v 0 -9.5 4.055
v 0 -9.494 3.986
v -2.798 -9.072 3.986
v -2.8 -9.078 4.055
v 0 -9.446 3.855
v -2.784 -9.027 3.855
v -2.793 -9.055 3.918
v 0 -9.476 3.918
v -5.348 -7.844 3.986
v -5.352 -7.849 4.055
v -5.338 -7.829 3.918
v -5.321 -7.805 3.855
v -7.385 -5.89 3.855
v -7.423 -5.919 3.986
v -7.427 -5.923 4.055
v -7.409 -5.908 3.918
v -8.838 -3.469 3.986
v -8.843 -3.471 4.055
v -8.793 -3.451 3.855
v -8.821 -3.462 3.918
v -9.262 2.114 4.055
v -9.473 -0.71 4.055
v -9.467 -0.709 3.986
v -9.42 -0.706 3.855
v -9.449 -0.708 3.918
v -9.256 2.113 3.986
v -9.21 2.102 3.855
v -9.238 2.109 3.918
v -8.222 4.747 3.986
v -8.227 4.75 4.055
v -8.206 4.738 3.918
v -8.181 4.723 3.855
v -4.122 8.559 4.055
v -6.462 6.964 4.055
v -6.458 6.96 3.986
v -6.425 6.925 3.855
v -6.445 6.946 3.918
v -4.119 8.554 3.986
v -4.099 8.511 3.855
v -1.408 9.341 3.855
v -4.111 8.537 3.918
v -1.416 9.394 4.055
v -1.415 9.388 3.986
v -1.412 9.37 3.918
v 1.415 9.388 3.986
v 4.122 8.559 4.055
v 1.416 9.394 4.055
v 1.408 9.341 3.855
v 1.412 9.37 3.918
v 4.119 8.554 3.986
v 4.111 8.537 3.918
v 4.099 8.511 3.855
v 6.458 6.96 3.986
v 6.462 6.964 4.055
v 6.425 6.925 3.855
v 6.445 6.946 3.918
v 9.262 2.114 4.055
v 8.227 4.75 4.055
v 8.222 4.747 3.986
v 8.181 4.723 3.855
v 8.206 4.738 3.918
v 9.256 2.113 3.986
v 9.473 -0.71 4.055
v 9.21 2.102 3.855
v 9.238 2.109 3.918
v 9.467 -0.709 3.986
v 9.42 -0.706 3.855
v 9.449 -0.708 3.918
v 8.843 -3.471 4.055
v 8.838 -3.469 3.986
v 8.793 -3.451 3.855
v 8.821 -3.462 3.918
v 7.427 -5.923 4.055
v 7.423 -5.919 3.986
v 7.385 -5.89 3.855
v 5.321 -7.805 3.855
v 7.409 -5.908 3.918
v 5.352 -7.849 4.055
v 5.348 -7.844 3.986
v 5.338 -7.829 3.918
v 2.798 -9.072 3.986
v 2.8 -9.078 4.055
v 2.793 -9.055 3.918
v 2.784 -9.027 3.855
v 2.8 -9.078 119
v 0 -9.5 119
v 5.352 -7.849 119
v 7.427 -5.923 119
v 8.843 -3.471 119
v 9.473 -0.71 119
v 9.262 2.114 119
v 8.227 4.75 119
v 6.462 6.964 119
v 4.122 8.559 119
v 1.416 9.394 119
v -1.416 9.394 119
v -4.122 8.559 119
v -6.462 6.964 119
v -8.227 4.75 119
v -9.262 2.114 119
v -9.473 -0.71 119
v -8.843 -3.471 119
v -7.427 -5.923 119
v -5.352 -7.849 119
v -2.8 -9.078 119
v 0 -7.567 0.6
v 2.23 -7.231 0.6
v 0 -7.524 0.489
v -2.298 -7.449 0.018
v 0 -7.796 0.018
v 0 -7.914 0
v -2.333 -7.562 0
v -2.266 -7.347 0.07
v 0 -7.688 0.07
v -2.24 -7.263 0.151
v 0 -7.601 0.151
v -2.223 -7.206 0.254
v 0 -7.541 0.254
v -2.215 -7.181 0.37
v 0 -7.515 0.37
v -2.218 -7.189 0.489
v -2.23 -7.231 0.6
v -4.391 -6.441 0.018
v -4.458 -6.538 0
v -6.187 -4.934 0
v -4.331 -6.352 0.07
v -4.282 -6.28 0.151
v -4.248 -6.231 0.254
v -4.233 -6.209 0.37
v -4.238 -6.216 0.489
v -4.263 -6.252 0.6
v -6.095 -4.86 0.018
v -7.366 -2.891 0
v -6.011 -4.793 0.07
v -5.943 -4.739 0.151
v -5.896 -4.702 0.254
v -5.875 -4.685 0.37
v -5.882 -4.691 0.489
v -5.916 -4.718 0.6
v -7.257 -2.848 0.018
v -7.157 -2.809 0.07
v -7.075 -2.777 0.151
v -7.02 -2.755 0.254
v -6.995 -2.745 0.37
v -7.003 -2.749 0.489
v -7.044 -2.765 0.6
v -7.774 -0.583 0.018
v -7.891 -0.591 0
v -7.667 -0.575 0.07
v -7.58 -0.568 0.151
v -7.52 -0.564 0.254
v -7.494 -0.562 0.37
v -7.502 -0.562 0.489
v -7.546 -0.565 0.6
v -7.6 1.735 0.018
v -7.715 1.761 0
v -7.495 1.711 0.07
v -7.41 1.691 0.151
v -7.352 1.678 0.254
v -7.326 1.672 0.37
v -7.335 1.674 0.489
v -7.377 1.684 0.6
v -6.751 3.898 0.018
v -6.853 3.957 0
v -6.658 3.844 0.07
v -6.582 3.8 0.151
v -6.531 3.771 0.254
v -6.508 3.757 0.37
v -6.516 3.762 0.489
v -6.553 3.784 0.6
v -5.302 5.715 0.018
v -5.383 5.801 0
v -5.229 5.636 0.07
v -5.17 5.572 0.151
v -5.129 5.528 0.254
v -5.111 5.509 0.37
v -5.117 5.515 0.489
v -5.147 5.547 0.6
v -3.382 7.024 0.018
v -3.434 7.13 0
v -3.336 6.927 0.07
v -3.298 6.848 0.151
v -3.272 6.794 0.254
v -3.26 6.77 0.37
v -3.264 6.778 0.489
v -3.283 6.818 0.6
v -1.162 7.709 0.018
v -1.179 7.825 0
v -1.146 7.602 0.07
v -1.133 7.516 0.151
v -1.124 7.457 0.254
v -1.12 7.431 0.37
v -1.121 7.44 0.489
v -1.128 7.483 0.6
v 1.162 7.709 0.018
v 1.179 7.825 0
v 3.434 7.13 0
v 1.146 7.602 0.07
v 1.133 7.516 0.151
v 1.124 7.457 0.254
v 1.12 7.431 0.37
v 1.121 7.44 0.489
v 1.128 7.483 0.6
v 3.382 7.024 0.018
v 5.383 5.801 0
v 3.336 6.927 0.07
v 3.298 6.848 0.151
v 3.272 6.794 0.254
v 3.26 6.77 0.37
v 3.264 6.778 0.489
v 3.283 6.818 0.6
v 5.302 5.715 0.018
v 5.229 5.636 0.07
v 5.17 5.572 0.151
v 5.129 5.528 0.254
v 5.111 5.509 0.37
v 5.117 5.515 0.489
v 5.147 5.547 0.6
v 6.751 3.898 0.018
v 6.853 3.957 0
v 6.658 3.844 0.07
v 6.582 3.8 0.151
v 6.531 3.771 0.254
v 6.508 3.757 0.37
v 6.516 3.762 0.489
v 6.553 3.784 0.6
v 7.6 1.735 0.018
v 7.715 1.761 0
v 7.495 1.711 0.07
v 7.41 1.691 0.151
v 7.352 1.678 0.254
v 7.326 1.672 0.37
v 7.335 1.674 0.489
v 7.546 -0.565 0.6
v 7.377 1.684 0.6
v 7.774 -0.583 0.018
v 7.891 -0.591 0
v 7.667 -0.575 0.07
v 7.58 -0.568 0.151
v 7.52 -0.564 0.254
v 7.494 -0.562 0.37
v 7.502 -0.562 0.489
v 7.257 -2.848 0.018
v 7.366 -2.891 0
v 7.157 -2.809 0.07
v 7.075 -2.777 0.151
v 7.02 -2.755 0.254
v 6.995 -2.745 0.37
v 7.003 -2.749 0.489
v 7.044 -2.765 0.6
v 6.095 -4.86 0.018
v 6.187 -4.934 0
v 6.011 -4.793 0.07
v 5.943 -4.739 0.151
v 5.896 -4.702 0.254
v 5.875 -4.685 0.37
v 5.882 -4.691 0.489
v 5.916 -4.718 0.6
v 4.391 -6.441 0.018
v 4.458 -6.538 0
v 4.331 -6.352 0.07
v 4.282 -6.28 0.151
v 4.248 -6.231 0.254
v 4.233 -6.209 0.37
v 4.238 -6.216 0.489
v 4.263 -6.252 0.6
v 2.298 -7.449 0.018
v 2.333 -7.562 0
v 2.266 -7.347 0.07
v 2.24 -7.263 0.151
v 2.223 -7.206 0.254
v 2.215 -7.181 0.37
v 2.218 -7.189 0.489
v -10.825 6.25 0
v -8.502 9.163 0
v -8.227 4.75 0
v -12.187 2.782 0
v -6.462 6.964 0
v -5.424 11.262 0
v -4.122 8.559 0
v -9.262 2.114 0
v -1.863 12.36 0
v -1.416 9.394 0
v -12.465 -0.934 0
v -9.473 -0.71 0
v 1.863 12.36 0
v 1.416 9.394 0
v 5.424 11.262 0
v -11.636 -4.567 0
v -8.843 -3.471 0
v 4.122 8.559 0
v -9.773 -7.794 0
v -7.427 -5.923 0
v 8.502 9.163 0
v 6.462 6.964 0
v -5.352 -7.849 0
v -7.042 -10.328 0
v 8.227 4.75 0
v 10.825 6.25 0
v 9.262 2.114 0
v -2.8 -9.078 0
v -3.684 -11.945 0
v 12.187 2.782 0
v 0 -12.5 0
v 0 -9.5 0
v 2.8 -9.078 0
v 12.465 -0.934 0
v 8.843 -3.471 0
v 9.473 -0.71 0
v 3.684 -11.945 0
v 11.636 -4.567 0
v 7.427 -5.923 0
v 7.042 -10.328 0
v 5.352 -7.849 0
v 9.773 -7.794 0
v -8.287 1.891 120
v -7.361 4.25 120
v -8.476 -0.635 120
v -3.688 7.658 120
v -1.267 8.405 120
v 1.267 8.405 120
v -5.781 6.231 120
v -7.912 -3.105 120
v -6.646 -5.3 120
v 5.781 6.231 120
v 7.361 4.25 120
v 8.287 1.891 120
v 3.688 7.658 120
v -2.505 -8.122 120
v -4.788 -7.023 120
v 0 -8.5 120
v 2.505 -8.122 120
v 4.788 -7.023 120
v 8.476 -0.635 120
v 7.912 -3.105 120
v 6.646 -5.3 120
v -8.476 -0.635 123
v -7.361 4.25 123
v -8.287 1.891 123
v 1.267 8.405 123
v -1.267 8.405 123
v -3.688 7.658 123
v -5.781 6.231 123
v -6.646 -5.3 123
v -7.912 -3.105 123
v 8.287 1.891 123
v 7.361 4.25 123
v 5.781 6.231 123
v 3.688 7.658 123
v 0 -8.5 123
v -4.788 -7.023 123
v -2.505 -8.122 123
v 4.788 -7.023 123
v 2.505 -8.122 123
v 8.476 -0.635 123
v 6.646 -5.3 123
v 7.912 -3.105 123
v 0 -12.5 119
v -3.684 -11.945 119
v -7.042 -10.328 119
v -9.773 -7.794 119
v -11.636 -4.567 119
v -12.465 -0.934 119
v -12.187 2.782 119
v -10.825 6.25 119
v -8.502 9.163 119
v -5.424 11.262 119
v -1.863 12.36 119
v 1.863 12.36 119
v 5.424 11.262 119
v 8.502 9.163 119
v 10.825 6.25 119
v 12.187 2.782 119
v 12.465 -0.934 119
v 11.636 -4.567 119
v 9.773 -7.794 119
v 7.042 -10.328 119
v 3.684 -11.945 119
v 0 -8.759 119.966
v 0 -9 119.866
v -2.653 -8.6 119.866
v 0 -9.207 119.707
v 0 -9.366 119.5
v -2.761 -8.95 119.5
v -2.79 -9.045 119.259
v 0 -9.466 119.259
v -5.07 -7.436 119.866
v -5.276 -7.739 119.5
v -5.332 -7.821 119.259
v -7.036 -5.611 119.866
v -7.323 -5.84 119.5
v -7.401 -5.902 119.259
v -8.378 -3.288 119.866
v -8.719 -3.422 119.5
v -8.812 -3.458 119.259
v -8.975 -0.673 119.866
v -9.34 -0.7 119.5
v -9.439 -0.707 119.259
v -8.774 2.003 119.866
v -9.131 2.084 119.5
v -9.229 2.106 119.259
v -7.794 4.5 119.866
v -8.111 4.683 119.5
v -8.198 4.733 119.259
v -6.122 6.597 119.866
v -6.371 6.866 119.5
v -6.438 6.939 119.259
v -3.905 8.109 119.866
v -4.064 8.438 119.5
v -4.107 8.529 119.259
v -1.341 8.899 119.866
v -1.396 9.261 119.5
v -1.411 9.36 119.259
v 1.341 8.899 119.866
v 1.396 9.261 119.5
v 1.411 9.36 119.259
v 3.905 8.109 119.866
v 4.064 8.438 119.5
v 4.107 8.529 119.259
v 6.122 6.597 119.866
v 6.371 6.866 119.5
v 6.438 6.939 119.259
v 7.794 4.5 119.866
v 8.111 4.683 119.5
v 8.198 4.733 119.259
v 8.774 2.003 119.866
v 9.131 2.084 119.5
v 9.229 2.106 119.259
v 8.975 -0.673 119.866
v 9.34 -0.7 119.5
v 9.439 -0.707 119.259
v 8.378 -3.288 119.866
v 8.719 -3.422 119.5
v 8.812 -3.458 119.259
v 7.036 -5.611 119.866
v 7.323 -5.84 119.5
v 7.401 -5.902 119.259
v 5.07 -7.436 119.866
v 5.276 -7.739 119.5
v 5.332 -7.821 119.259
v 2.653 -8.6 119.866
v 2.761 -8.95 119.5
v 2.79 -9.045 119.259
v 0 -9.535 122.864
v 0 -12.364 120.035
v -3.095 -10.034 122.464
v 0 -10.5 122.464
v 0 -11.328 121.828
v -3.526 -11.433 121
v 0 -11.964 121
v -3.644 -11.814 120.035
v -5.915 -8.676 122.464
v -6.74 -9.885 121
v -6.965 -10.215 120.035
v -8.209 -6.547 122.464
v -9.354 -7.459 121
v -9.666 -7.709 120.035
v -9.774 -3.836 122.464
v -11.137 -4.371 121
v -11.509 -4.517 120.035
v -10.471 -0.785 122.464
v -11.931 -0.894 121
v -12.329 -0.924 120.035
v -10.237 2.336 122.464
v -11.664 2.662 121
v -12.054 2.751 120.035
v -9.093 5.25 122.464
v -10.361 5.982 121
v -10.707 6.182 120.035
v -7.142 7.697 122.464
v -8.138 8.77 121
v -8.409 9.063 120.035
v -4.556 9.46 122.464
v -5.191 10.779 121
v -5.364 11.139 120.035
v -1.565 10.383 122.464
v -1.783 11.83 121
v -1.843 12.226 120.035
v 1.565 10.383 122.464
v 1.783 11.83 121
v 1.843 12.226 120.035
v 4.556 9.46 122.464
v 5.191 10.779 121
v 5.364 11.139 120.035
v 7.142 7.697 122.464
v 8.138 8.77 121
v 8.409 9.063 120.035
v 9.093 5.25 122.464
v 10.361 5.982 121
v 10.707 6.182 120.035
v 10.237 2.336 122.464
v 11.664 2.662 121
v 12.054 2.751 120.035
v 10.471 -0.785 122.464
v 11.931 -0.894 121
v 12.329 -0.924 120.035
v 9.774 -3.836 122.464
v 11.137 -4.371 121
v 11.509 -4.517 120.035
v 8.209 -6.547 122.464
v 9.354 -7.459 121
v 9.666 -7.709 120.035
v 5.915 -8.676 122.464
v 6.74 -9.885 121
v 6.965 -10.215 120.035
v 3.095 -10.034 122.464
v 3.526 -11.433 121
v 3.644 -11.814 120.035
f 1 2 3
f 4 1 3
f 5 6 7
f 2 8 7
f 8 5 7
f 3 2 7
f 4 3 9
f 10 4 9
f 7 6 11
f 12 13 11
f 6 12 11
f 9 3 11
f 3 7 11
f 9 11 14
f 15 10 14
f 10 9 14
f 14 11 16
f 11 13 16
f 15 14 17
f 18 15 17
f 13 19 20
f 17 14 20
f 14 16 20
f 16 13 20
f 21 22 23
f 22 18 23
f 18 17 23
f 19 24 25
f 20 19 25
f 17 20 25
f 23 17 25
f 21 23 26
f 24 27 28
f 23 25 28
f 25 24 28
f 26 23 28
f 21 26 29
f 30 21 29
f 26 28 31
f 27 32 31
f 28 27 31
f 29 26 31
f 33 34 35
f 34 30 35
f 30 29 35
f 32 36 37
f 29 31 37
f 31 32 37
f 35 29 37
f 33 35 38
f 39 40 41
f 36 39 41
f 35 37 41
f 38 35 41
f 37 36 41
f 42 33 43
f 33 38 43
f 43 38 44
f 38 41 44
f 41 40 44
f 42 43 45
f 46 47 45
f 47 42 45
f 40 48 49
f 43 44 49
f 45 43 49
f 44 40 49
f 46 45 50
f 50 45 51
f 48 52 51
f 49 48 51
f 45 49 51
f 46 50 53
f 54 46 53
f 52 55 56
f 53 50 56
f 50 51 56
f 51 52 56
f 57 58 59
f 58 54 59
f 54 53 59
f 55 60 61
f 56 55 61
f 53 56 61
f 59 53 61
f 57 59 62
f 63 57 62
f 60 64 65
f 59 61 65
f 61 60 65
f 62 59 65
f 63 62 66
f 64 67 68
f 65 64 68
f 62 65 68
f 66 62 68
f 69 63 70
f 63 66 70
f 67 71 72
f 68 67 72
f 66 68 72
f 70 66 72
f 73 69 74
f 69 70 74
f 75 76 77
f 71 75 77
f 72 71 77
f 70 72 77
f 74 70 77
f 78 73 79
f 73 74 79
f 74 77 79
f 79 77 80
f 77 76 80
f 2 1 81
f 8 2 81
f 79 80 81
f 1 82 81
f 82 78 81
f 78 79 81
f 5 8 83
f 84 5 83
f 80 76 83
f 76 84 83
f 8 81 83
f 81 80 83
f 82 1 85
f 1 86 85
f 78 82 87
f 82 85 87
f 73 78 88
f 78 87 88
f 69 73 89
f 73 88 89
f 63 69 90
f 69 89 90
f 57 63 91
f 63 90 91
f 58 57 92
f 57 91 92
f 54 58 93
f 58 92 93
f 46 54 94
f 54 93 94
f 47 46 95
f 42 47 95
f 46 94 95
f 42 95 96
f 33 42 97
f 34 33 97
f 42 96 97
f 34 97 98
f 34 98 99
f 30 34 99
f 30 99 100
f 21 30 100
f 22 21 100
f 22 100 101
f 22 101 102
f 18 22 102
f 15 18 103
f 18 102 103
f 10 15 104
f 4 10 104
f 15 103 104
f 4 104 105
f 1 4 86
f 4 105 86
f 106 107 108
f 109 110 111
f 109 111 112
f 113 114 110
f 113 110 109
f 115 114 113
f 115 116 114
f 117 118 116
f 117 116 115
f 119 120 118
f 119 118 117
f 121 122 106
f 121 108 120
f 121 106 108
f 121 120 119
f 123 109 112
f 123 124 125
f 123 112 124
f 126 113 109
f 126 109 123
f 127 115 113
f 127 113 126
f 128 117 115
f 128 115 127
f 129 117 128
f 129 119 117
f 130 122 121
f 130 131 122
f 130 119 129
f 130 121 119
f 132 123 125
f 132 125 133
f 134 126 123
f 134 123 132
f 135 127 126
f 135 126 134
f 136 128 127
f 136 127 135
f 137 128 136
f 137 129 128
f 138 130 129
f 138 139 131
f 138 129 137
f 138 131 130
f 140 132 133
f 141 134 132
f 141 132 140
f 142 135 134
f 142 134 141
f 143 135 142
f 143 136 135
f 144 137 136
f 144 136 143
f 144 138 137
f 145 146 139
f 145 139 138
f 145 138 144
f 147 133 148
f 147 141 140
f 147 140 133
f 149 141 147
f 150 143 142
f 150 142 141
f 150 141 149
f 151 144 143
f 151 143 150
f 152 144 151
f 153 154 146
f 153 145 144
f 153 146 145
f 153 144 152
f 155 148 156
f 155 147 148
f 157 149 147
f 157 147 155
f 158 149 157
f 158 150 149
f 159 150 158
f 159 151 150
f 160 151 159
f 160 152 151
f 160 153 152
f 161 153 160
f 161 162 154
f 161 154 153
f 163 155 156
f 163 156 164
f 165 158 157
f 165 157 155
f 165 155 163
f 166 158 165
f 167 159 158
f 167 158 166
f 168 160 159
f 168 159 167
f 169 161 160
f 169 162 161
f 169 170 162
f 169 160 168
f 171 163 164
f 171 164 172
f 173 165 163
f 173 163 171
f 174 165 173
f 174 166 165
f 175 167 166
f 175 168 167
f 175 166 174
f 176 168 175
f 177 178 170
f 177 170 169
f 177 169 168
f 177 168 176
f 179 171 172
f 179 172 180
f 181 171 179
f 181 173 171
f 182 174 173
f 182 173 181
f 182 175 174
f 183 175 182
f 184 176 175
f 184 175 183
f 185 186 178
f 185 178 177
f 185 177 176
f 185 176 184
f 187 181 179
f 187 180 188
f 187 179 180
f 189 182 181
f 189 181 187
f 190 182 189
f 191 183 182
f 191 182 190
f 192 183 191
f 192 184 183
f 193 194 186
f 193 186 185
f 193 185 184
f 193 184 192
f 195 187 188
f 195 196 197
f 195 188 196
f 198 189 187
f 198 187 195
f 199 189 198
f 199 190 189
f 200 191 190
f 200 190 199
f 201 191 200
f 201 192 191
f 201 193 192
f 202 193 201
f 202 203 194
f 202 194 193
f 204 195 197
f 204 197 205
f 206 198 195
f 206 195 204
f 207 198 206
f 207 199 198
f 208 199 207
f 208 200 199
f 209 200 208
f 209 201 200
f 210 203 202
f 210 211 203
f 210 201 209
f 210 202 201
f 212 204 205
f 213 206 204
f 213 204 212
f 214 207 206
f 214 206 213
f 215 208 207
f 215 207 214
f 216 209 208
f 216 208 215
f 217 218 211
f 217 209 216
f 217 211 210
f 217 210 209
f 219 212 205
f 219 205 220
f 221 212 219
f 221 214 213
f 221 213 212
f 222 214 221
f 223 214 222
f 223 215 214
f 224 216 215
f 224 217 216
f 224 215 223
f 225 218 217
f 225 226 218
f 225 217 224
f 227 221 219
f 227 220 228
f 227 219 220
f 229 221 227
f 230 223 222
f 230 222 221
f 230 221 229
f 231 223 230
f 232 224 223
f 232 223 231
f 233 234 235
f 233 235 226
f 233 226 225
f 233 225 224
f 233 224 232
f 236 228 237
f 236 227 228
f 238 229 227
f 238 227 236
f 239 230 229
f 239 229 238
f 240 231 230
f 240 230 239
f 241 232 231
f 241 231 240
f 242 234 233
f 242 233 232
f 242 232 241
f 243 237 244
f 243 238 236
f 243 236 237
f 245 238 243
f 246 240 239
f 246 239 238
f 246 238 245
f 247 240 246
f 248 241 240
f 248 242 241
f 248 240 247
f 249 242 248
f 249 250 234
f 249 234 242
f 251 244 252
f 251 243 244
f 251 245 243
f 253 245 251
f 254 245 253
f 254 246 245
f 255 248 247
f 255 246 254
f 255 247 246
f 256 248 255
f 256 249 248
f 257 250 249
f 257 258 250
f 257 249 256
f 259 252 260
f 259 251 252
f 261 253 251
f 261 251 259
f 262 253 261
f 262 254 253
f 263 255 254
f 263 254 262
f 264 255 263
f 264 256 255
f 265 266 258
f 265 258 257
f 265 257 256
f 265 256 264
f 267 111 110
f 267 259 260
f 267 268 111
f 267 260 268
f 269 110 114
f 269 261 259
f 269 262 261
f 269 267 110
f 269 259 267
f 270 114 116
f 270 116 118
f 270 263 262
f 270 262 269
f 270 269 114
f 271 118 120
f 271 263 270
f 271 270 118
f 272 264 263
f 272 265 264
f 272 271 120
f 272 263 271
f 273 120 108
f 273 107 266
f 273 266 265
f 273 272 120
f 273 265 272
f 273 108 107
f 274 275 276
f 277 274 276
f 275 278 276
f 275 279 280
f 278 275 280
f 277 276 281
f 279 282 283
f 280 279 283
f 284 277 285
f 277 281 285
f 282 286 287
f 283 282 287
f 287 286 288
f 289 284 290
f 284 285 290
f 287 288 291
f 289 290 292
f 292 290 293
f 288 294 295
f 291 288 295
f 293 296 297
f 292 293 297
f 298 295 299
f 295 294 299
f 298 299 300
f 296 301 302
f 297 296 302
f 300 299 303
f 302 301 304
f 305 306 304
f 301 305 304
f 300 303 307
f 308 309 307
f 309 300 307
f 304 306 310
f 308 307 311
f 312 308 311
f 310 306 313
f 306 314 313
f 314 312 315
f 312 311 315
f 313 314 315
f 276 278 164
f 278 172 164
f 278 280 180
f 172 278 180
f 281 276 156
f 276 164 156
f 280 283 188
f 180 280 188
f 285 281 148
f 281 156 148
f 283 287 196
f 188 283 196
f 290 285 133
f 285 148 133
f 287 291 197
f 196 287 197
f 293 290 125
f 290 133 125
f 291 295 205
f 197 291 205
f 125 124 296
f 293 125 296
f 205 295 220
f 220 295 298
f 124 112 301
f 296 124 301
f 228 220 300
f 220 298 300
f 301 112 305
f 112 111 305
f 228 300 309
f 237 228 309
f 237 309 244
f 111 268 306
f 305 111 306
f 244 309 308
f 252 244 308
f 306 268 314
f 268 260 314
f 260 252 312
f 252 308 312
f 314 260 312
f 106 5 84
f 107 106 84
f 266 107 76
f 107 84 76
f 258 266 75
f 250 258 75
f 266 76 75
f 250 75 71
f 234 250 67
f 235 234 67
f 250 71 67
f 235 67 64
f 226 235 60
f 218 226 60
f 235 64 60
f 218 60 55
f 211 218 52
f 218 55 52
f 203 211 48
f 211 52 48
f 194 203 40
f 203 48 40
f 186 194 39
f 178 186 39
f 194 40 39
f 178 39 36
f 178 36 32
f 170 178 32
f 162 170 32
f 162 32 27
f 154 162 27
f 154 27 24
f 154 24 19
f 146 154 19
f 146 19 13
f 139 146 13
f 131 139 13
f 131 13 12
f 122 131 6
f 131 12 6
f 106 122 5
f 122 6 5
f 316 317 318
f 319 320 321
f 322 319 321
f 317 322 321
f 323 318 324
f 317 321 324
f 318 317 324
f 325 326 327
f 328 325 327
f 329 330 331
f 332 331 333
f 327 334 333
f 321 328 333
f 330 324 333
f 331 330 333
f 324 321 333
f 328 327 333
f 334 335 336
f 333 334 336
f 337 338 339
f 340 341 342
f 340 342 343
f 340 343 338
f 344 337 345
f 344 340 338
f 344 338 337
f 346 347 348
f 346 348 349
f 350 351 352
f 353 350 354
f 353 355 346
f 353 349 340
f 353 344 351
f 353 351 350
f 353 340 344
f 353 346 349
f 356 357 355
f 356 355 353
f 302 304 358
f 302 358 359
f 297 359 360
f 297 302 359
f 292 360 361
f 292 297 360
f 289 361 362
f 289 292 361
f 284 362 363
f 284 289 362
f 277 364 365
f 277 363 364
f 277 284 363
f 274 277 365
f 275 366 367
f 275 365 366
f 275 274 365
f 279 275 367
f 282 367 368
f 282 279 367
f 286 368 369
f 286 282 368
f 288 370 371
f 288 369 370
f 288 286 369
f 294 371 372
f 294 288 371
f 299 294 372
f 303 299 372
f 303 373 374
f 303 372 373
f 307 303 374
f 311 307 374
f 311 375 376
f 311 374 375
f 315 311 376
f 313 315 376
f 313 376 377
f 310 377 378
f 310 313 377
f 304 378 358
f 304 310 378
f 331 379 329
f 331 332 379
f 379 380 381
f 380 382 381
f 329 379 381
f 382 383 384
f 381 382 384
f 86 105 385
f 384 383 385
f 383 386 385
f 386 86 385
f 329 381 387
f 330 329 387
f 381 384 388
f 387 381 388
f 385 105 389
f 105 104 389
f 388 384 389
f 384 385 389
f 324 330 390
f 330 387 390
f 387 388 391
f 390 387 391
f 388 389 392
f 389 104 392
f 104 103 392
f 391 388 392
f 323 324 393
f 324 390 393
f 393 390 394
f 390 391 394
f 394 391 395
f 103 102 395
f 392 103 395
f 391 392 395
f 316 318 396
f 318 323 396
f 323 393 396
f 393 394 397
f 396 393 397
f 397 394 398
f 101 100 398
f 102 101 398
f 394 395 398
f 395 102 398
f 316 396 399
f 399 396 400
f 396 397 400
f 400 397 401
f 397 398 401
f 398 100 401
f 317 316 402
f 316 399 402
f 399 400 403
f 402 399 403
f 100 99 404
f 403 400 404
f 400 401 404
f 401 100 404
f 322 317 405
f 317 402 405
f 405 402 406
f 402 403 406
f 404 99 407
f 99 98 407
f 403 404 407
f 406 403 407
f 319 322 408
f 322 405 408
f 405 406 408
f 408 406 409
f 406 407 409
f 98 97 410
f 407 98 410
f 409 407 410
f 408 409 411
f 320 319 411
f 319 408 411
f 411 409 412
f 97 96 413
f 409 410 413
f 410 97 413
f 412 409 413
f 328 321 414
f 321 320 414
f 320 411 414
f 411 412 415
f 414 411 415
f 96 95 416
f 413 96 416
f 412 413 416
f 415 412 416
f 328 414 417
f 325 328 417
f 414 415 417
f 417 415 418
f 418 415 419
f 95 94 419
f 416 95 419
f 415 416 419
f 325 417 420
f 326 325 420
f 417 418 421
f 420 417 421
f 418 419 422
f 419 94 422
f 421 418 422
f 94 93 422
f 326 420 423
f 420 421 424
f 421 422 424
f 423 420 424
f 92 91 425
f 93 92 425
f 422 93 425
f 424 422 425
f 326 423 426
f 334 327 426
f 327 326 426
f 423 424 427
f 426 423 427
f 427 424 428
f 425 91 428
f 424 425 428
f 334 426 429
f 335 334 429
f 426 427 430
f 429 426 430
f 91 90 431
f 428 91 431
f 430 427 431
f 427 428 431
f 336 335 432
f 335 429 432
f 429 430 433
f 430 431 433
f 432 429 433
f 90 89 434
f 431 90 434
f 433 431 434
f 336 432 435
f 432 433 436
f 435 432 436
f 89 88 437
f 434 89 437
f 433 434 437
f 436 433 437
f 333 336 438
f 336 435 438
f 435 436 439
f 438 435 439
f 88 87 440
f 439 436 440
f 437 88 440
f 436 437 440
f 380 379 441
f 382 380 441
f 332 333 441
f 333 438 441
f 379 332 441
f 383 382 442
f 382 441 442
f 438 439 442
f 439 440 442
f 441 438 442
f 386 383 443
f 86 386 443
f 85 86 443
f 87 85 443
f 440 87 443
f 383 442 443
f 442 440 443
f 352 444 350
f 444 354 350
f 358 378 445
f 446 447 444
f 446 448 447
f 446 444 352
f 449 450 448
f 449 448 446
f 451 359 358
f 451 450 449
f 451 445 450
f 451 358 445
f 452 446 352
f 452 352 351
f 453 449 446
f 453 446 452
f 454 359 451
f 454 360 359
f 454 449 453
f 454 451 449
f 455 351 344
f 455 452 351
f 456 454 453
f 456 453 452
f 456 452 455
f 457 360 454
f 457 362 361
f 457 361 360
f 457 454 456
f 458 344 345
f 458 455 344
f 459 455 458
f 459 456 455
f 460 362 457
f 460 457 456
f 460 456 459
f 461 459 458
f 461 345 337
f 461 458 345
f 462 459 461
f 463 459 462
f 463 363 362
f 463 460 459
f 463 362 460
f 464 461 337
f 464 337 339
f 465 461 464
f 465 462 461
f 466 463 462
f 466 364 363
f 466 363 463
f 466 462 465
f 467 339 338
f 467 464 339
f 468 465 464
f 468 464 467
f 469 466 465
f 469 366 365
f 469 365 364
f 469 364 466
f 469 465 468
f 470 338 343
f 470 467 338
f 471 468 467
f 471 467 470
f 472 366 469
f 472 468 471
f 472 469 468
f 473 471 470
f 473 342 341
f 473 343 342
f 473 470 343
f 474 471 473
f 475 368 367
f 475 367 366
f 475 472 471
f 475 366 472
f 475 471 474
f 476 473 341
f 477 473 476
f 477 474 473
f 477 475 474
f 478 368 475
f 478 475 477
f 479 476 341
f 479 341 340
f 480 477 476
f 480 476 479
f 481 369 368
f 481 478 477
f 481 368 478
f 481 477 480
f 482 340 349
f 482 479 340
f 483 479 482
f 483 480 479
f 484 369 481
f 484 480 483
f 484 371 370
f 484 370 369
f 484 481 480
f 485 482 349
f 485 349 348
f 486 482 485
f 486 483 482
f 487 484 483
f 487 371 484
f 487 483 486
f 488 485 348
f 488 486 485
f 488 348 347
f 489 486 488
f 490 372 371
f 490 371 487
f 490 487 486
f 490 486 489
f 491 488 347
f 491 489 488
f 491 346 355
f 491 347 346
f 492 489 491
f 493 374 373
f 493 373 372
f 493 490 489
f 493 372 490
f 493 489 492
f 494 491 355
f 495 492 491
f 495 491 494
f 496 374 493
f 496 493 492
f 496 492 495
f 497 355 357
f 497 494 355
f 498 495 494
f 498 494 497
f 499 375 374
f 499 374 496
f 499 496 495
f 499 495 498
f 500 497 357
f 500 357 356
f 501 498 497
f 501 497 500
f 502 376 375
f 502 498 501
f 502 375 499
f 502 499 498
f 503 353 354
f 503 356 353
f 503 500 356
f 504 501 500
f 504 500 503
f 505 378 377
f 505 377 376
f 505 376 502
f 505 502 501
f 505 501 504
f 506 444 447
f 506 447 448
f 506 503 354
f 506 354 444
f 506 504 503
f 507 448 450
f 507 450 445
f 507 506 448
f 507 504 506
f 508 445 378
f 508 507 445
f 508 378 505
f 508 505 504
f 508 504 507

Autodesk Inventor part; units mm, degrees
ref_plane "YZ Plane" through (0, 0, 0) normal (1, 0, 0) x (0, 1, 0)
ref_plane "XZ Plane" through (0, 0, 0) normal (0, 1, 0) x (-1, 0, 0)
ref_plane "XY Plane" through (0, 0, 0) normal (0, 0, 1) x (1, 0, 0)
sketch "Sketch4" plane through (0, 0, 0) normal (1, 0, 0) x (0, 1, 0)
  line L0 (-12.5, 0) -> (12.5, 0) projected
  line L1 (-12.5, 0) -> (-9.5, 0)
  line L2 (-9.5, 4.0551) -> (-9.5, 119)
  line L3 (0, 120) -> (0, 123)
  line L4 (0, 123) -> (-8.5, 123)
  arc A0 (-8.5, 123) -> (-12.5, 119) centre (-8.5, 119) ccw
  line L5 (-12.5, 119) -> (-12.5, 0)
  line L6 (-8.5, 120) -> (0, 120)
  arc A1 (-8.5, 120) -> (-9.5, 119) centre (-8.5, 119) ccw
  line L7 (-9.5, 0) -> (-7.9135, 0)
  line L8 (-7.5671, 0.6) -> (-9.4464, 3.8551)
  line L9 (-7.2207, 0) -> (-1.4448, 0) construction
  arc A2 (-9.5, 4.0551) -> (-9.4464, 3.8551) centre (-9.1, 4.0551) ccw
  arc A3 (-7.9135, 0) -> (-7.5671, 0.6) centre (-7.9135, 0.4) ccw
  point P0 (0, 0)
  point P1 (-9.5, 120)
  point P2 (-6.5, 0)
  point P3 (-9.5, 3.9479)
  dimension "d7" = 120
  dimension "d8" = 3
  dimension "d9" = 4
  dimension "d10" = 1
  dimension "d11" = 3
  dimension "d14" = 120
  dimension "d15" = 0.4
revolve "Revolution1" add sketch "Sketch4" angle 360 about axis through (0, 0, 120) along (0, 0, 1)
properties part number "Diffueser"
